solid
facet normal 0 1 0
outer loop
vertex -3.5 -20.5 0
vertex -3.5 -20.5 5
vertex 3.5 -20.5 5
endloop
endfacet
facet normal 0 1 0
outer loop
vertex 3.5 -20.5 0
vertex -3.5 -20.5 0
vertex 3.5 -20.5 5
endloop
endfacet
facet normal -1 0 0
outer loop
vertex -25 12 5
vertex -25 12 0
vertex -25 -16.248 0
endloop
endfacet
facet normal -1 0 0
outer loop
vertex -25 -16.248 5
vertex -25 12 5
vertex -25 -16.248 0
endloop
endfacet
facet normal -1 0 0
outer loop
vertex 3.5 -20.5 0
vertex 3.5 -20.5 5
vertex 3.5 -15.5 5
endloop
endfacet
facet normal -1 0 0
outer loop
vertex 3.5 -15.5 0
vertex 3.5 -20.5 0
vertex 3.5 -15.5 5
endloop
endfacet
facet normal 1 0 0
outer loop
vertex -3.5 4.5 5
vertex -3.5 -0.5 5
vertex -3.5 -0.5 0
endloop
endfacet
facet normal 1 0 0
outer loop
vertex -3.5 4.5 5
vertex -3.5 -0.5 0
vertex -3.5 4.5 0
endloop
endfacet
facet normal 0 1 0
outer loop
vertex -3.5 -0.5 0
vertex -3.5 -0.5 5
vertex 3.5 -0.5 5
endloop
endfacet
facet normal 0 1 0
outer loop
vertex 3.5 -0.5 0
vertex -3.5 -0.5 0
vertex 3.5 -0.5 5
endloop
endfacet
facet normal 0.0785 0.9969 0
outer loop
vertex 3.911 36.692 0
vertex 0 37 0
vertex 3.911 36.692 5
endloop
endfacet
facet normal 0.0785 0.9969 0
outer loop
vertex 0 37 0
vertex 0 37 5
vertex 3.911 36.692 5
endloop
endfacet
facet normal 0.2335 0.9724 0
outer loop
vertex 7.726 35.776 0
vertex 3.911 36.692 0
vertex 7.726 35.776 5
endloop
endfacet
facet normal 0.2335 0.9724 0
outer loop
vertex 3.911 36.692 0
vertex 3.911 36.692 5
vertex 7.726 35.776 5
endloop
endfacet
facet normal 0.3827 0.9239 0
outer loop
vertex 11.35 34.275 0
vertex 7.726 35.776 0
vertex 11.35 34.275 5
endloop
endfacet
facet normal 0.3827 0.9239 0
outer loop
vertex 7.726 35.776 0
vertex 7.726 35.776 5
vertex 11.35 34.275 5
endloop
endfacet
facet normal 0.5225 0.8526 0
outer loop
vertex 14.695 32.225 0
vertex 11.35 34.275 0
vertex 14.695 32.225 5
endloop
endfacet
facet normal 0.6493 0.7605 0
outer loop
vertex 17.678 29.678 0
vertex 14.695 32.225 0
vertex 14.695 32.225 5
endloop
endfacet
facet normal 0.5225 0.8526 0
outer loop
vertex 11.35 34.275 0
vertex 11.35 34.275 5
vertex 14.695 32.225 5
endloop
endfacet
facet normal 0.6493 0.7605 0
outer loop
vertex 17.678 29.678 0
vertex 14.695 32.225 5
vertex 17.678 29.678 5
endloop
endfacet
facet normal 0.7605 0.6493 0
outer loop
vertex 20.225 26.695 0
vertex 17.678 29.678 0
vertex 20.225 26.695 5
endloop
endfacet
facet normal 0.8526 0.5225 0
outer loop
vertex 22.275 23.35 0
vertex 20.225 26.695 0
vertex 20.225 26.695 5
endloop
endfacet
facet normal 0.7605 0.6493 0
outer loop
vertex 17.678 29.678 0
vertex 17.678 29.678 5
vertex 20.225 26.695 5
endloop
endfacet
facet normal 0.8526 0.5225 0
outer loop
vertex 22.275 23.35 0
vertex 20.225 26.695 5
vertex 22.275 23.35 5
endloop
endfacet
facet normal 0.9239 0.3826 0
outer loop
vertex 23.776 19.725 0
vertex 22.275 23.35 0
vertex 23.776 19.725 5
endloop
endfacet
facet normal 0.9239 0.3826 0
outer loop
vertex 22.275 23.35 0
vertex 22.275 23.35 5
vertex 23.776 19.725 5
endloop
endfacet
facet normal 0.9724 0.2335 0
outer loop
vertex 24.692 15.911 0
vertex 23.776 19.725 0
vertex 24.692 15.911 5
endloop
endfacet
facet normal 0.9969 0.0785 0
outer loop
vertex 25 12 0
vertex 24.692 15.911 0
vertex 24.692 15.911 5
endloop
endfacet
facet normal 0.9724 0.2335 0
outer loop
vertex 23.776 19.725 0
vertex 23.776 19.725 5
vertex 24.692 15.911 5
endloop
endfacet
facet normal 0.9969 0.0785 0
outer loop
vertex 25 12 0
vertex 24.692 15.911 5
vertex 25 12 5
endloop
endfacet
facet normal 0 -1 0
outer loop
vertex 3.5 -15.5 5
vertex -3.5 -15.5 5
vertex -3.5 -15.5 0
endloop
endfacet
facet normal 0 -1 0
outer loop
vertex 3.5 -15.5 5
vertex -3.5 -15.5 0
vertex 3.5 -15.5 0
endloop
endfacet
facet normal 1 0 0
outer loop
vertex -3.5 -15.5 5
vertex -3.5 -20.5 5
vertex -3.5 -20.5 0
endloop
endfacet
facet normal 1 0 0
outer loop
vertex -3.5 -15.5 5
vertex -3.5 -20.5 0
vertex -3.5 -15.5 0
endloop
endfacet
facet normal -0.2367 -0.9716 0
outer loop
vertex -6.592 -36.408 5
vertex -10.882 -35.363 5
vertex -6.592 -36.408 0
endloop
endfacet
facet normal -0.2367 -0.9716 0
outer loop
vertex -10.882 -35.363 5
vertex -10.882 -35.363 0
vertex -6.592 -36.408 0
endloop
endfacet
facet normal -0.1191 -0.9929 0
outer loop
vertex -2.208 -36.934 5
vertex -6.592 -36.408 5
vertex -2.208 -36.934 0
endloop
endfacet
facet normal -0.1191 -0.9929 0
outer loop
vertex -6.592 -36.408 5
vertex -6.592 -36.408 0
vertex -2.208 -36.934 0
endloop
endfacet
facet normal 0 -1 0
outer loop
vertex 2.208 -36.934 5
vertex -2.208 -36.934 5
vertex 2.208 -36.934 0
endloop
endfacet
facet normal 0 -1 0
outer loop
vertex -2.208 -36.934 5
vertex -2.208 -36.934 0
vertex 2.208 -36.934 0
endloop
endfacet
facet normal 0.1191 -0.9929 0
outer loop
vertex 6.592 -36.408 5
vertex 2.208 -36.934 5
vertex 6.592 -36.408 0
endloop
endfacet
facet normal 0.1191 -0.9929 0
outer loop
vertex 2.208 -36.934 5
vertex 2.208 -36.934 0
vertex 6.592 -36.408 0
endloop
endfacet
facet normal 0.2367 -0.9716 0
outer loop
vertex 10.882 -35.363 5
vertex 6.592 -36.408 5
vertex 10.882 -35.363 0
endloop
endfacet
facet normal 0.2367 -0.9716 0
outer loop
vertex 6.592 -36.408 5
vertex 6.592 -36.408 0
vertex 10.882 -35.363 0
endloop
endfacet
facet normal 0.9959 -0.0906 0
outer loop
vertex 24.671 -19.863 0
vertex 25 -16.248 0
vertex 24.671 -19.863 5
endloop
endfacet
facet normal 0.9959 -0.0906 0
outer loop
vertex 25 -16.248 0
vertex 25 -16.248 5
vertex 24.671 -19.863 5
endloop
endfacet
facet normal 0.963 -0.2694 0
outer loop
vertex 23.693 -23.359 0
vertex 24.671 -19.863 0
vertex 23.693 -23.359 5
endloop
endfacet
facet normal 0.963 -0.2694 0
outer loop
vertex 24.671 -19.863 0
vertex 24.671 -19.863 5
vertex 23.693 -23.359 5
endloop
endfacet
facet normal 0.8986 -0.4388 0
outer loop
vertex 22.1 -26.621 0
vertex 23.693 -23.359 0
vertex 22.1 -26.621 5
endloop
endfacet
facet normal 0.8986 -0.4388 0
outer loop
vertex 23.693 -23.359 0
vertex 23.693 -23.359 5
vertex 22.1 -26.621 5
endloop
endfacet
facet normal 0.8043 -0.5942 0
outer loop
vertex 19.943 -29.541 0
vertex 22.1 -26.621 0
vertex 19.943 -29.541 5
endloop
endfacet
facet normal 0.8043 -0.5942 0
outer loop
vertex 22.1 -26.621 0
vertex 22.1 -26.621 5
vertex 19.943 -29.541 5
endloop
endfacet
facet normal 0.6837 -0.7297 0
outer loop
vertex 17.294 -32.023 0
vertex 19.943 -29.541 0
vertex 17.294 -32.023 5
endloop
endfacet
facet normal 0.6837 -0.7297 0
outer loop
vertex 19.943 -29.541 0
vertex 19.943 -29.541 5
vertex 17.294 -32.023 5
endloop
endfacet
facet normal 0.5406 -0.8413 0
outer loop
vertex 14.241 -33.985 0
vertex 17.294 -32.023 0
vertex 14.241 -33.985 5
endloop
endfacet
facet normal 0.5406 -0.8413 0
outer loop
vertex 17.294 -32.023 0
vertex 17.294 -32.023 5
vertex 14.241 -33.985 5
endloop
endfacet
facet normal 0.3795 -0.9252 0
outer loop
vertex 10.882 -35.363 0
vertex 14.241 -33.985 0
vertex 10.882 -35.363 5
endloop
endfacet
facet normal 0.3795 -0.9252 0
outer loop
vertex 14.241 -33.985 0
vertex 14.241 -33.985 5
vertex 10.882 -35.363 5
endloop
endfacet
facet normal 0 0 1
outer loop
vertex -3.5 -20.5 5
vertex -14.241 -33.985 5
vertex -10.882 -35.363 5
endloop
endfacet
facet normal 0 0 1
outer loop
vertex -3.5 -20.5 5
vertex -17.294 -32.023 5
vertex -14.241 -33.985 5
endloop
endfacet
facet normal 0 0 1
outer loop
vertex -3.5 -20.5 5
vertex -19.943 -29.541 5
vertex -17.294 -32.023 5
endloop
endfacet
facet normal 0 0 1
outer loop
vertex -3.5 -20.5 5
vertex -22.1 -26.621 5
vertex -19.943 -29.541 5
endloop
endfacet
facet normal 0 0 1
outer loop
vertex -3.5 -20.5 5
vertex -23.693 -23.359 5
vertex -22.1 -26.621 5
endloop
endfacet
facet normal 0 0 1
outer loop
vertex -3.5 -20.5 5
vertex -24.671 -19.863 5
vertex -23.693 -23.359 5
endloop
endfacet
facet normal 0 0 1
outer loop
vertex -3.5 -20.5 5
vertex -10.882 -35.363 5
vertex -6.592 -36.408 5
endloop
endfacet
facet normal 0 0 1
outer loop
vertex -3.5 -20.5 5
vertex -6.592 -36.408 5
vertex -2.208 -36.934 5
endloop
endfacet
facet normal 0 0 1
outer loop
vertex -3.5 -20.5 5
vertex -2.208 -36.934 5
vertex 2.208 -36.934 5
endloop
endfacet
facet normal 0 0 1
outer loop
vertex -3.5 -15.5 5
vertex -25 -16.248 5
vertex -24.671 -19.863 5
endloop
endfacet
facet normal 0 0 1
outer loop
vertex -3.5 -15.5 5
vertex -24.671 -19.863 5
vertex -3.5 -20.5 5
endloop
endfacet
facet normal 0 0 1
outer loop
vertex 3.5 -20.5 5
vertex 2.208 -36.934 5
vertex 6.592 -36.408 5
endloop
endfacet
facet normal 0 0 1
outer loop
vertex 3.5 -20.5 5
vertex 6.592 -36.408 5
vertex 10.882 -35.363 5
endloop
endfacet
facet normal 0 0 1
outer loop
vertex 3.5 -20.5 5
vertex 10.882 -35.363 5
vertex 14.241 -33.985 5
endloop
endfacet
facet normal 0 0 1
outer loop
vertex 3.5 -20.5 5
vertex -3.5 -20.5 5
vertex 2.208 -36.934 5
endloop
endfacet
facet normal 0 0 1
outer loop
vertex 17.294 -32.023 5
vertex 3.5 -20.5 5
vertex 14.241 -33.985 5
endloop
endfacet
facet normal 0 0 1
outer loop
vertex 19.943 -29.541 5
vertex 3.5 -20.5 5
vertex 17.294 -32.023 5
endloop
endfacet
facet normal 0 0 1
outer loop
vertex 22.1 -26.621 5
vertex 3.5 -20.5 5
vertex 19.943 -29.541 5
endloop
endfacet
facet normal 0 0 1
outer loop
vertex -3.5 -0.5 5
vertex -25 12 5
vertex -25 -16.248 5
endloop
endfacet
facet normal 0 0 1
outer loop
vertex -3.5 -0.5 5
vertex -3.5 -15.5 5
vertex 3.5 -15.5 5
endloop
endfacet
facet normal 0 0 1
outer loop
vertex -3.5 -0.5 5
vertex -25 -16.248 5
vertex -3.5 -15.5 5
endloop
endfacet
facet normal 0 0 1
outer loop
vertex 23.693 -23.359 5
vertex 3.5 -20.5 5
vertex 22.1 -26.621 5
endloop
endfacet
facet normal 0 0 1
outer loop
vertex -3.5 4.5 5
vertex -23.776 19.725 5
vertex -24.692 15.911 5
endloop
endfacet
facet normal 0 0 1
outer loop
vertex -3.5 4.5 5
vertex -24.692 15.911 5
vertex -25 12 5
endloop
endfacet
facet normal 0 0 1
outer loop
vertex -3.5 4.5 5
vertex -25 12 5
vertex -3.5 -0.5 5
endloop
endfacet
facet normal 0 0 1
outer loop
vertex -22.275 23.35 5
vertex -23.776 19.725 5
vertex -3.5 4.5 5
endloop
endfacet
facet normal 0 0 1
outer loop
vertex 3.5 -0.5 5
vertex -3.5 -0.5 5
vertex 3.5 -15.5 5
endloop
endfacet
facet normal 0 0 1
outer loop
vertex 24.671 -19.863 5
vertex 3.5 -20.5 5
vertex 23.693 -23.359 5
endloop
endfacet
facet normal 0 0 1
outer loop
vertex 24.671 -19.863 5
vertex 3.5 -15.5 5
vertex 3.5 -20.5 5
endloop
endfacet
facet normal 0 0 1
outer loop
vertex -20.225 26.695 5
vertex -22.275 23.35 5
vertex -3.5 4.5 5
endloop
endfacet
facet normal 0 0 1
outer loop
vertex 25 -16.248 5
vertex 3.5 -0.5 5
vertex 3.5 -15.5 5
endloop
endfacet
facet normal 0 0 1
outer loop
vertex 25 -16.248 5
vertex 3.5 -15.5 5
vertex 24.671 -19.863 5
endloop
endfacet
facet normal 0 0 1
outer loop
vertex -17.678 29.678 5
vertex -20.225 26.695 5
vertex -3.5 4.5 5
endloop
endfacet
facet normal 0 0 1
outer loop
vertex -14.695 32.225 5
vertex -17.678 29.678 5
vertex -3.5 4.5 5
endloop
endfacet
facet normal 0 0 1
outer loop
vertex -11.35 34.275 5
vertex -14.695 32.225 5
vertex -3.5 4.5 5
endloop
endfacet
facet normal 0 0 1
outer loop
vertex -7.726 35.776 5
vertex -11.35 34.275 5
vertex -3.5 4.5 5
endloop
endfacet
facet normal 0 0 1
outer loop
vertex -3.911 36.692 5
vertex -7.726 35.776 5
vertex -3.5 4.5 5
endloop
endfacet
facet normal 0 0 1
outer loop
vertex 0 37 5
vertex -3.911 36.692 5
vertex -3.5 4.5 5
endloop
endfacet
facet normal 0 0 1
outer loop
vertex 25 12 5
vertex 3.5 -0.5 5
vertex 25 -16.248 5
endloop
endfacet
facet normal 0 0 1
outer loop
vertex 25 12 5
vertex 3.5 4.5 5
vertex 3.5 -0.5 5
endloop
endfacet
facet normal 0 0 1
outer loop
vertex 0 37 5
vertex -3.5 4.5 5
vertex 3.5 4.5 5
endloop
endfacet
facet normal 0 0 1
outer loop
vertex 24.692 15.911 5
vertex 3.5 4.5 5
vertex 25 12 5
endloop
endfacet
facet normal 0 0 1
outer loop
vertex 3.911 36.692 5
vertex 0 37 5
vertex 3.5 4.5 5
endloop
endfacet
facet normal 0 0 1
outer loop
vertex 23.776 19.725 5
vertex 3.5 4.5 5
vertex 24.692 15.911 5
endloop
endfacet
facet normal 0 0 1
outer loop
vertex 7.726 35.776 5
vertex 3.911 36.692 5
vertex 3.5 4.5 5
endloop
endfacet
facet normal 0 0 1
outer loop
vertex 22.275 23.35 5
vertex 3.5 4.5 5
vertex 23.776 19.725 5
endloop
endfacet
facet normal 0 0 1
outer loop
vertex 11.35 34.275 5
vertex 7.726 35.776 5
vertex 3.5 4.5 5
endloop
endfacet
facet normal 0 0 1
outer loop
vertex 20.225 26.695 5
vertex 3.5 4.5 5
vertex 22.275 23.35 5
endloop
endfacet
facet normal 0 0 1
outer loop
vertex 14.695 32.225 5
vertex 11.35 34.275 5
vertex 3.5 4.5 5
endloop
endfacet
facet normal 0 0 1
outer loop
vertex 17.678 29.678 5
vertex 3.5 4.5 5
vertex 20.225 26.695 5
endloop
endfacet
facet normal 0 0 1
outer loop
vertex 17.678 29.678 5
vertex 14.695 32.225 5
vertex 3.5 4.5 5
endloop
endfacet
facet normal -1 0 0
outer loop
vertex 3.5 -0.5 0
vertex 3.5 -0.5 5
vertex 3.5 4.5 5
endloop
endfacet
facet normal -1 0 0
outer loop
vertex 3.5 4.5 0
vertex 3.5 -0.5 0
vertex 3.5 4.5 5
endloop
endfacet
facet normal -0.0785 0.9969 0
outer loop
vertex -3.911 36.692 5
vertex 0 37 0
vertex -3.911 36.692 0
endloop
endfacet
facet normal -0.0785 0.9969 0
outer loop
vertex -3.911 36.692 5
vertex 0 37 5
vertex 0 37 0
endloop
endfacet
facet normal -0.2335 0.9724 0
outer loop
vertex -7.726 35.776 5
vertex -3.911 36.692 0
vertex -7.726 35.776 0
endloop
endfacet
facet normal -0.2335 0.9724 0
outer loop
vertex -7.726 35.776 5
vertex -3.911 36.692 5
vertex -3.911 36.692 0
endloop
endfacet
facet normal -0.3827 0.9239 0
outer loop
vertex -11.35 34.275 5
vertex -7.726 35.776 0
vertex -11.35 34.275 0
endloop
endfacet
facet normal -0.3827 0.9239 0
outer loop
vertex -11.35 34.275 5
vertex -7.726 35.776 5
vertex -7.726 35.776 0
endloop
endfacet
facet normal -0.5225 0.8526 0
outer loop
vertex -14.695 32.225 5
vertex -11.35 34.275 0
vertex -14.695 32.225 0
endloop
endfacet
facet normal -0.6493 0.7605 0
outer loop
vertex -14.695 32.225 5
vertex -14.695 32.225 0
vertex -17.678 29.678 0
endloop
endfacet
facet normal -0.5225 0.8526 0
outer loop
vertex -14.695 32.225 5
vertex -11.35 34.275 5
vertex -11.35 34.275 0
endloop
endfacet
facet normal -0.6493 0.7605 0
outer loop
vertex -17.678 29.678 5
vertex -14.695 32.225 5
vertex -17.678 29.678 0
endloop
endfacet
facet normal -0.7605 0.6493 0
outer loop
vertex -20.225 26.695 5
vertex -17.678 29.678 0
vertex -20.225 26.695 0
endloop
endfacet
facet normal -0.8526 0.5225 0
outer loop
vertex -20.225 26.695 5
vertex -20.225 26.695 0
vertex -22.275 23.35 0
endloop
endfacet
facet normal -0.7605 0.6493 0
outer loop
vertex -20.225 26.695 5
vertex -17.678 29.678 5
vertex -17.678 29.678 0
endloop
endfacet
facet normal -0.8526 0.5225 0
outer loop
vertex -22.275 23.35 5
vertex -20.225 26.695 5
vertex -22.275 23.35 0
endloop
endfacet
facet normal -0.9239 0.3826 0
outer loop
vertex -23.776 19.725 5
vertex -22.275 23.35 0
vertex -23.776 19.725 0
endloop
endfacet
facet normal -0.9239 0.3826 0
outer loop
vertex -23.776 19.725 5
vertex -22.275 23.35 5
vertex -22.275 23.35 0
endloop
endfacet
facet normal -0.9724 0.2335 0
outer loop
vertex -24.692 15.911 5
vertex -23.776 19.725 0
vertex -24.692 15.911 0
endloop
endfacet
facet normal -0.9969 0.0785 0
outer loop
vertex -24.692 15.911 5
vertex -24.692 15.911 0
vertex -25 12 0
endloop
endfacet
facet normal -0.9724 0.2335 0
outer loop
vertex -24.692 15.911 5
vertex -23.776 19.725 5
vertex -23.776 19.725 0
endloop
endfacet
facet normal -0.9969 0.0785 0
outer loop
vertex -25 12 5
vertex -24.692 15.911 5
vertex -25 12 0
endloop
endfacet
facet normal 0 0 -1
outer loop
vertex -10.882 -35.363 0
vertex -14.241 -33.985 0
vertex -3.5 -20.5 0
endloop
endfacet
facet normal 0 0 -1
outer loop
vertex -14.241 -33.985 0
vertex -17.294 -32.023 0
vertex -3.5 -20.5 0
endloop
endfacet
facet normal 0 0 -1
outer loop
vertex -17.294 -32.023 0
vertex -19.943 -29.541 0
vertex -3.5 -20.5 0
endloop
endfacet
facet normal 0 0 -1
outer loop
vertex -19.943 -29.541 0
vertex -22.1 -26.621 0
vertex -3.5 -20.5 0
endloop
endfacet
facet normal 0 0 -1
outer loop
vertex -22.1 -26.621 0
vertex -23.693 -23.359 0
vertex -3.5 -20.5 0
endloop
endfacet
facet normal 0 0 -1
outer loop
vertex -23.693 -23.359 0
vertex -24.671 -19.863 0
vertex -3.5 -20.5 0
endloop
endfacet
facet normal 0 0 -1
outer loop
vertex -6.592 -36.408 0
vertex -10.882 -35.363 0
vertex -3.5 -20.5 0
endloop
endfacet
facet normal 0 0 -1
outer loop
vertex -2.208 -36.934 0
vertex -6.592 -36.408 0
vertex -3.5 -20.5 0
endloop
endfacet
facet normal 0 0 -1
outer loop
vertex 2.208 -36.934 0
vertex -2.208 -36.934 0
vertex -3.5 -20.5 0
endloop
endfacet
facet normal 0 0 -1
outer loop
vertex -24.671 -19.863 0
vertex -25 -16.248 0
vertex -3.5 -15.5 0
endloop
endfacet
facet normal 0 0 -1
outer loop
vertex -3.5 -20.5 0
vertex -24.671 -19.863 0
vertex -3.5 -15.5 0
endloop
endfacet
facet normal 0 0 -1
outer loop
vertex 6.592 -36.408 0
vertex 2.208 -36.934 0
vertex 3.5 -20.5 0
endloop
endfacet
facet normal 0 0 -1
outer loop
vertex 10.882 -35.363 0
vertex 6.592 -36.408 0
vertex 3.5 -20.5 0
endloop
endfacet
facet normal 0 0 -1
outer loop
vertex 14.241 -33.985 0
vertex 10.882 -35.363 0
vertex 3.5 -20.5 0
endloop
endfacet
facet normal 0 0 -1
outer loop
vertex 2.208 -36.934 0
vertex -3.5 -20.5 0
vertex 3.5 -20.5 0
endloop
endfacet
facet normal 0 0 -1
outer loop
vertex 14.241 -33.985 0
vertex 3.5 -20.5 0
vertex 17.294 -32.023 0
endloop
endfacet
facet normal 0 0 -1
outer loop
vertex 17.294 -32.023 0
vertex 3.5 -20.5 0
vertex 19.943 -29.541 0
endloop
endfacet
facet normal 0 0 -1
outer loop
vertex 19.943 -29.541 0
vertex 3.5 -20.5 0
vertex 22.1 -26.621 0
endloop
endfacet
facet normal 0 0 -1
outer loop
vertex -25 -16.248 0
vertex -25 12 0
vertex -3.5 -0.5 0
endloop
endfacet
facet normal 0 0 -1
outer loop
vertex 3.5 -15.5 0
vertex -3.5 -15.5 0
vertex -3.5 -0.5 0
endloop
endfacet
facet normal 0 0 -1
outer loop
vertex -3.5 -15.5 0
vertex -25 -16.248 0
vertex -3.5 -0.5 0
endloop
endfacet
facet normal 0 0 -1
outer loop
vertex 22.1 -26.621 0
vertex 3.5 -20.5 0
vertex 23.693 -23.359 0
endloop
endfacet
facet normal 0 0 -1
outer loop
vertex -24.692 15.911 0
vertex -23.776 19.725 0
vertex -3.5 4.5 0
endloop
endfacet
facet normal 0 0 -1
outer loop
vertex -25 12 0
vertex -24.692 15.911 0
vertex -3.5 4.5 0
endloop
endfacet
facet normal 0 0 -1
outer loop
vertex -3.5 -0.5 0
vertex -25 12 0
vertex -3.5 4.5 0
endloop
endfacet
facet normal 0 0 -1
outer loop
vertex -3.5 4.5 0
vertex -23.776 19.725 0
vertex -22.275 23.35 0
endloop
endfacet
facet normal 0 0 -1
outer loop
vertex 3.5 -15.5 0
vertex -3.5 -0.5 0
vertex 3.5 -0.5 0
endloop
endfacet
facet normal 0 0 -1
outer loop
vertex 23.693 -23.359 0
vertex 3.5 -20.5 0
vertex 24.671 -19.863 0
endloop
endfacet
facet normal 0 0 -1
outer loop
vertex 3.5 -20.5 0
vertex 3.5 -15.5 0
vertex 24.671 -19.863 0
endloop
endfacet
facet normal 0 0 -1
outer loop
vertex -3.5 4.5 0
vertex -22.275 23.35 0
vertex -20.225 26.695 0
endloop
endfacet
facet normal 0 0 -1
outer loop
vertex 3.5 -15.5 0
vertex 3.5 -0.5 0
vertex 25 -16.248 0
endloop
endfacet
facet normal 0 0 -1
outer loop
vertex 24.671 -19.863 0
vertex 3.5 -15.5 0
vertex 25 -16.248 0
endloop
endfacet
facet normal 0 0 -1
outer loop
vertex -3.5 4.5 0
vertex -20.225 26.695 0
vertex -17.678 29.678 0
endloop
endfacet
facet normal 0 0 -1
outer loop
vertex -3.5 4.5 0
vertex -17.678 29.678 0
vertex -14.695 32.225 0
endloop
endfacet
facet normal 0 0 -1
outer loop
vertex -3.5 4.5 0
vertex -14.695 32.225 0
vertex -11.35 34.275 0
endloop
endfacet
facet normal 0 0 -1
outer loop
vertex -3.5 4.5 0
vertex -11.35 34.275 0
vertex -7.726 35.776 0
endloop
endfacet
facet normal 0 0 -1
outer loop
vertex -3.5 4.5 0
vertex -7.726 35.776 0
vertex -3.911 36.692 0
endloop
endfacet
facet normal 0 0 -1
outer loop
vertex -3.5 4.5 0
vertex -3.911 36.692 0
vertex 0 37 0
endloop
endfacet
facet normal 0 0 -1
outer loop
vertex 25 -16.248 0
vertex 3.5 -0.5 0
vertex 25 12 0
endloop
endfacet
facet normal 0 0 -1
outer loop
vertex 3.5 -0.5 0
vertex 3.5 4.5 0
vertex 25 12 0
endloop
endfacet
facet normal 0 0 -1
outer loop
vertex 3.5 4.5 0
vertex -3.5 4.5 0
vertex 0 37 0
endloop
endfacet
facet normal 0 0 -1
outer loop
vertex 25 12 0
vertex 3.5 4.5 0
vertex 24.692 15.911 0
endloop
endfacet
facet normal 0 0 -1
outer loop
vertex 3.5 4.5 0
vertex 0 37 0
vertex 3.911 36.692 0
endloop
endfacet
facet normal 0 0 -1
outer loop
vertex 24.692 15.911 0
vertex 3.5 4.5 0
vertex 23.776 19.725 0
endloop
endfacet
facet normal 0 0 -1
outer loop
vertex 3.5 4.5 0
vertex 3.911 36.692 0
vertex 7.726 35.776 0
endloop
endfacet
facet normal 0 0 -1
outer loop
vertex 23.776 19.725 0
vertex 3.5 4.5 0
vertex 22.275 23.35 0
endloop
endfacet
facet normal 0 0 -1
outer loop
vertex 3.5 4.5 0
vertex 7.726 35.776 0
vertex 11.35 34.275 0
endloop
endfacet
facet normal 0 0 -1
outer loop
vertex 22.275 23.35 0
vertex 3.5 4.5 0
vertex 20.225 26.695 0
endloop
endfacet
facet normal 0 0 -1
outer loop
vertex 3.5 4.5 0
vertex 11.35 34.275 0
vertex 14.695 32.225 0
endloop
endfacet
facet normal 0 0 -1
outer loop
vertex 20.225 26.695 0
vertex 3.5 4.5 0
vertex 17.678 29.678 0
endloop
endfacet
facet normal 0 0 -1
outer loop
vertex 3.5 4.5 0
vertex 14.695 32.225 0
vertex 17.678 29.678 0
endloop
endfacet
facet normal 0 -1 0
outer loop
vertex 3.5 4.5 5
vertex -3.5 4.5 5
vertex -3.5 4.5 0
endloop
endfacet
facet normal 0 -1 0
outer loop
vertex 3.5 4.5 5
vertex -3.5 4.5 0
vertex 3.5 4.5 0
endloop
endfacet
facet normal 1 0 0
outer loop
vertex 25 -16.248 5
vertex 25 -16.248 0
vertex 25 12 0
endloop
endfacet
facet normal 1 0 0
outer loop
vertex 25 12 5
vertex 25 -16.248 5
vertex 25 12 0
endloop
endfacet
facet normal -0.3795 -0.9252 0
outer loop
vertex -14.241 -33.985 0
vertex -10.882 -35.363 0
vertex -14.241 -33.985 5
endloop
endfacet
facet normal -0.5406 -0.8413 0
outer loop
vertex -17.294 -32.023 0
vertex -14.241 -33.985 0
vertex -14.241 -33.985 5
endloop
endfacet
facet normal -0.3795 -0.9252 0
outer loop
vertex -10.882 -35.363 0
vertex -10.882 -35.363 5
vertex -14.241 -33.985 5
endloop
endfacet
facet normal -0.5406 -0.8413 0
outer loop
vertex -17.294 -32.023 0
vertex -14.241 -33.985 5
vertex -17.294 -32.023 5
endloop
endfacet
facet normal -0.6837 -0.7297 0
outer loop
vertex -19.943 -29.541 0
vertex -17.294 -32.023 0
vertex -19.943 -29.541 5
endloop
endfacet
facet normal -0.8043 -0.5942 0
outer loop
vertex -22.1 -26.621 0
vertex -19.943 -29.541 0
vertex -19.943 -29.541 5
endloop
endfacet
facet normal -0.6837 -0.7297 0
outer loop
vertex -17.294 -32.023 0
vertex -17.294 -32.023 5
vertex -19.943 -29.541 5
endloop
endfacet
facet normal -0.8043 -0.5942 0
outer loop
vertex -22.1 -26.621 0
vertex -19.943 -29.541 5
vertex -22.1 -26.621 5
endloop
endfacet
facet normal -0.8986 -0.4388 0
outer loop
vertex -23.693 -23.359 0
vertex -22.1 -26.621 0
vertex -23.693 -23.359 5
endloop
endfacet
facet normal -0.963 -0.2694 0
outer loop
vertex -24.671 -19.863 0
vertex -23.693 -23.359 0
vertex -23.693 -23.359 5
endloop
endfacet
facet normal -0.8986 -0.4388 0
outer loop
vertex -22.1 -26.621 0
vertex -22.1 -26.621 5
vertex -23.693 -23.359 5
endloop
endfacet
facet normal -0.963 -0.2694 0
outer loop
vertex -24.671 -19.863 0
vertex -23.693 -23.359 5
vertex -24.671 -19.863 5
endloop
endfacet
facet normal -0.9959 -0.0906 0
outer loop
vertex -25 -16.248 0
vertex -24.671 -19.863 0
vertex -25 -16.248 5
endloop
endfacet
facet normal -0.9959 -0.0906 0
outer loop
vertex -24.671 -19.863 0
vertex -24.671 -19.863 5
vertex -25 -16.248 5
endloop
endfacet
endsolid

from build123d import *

# Parameters (mm, degrees)
SKETCH1_R           = 37
BOSS_EXTRUDE1_DEPTH = 5
CUT_EXTRUDE3_START  = -10
CUT_EXTRUDE3_DEPTH  = 10
FILLET1_R           = 25
FILLET2_R           = 20
SKETCH11_W          = 7
SKETCH11_H          = 5
CUT_EXTRUDE4_DEPTH  = 10


with BuildPart() as part:
    # Sketch1 → Boss-Extrude1 (new body)
    with BuildSketch(Plane.XY):
        Circle(SKETCH1_R)
    extrude(amount=BOSS_EXTRUDE1_DEPTH)

    # Sketch10 → Cut-Extrude3 (cut)
    with BuildSketch(Plane.XY.offset(5).offset(CUT_EXTRUDE3_START)):
        with BuildLine():
            Line((-25, 27.276363394), (-25, -27.276363394))
            ThreePointArc((-25, -27.276363394), (-37, 0), (-25, 27.276363394))
        make_face()
        with BuildLine():
            Line((25, -27.276363394), (25, 27.276363394))
            ThreePointArc((25, 27.276363394), (37, 0), (25, -27.276363394))
        make_face()
    extrude(amount=CUT_EXTRUDE3_DEPTH, mode=Mode.SUBTRACT)

    # Fillet1
    fillet1_edges = [part.edges().sort_by_distance(p)[0] for p in [
        (-25, 27.276363394, 2.5),
        (25, 27.276363394, 2.5),
    ]]
    fillet(fillet1_edges, radius=FILLET1_R - 0.0001)  # a hair under: the kernel refuses the full size

    # Fillet2
    fillet2_edges = [part.edges().sort_by_distance(p)[0] for p in [
        (-25, -27.276363394, 2.5),
        (25, -27.276363394, 2.5),
    ]]
    fillet(fillet2_edges, radius=FILLET2_R)

    # Sketch11 → Cut-Extrude4 (cut)
    with BuildSketch(Plane.XY.offset(5)):
        with Locations((0, 2)):
            Rectangle(SKETCH11_W, SKETCH11_H)
        with Locations((0, -18)):
            Rectangle(SKETCH11_W, SKETCH11_H)
    extrude(amount=-CUT_EXTRUDE4_DEPTH, mode=Mode.SUBTRACT)


solid = part.part
